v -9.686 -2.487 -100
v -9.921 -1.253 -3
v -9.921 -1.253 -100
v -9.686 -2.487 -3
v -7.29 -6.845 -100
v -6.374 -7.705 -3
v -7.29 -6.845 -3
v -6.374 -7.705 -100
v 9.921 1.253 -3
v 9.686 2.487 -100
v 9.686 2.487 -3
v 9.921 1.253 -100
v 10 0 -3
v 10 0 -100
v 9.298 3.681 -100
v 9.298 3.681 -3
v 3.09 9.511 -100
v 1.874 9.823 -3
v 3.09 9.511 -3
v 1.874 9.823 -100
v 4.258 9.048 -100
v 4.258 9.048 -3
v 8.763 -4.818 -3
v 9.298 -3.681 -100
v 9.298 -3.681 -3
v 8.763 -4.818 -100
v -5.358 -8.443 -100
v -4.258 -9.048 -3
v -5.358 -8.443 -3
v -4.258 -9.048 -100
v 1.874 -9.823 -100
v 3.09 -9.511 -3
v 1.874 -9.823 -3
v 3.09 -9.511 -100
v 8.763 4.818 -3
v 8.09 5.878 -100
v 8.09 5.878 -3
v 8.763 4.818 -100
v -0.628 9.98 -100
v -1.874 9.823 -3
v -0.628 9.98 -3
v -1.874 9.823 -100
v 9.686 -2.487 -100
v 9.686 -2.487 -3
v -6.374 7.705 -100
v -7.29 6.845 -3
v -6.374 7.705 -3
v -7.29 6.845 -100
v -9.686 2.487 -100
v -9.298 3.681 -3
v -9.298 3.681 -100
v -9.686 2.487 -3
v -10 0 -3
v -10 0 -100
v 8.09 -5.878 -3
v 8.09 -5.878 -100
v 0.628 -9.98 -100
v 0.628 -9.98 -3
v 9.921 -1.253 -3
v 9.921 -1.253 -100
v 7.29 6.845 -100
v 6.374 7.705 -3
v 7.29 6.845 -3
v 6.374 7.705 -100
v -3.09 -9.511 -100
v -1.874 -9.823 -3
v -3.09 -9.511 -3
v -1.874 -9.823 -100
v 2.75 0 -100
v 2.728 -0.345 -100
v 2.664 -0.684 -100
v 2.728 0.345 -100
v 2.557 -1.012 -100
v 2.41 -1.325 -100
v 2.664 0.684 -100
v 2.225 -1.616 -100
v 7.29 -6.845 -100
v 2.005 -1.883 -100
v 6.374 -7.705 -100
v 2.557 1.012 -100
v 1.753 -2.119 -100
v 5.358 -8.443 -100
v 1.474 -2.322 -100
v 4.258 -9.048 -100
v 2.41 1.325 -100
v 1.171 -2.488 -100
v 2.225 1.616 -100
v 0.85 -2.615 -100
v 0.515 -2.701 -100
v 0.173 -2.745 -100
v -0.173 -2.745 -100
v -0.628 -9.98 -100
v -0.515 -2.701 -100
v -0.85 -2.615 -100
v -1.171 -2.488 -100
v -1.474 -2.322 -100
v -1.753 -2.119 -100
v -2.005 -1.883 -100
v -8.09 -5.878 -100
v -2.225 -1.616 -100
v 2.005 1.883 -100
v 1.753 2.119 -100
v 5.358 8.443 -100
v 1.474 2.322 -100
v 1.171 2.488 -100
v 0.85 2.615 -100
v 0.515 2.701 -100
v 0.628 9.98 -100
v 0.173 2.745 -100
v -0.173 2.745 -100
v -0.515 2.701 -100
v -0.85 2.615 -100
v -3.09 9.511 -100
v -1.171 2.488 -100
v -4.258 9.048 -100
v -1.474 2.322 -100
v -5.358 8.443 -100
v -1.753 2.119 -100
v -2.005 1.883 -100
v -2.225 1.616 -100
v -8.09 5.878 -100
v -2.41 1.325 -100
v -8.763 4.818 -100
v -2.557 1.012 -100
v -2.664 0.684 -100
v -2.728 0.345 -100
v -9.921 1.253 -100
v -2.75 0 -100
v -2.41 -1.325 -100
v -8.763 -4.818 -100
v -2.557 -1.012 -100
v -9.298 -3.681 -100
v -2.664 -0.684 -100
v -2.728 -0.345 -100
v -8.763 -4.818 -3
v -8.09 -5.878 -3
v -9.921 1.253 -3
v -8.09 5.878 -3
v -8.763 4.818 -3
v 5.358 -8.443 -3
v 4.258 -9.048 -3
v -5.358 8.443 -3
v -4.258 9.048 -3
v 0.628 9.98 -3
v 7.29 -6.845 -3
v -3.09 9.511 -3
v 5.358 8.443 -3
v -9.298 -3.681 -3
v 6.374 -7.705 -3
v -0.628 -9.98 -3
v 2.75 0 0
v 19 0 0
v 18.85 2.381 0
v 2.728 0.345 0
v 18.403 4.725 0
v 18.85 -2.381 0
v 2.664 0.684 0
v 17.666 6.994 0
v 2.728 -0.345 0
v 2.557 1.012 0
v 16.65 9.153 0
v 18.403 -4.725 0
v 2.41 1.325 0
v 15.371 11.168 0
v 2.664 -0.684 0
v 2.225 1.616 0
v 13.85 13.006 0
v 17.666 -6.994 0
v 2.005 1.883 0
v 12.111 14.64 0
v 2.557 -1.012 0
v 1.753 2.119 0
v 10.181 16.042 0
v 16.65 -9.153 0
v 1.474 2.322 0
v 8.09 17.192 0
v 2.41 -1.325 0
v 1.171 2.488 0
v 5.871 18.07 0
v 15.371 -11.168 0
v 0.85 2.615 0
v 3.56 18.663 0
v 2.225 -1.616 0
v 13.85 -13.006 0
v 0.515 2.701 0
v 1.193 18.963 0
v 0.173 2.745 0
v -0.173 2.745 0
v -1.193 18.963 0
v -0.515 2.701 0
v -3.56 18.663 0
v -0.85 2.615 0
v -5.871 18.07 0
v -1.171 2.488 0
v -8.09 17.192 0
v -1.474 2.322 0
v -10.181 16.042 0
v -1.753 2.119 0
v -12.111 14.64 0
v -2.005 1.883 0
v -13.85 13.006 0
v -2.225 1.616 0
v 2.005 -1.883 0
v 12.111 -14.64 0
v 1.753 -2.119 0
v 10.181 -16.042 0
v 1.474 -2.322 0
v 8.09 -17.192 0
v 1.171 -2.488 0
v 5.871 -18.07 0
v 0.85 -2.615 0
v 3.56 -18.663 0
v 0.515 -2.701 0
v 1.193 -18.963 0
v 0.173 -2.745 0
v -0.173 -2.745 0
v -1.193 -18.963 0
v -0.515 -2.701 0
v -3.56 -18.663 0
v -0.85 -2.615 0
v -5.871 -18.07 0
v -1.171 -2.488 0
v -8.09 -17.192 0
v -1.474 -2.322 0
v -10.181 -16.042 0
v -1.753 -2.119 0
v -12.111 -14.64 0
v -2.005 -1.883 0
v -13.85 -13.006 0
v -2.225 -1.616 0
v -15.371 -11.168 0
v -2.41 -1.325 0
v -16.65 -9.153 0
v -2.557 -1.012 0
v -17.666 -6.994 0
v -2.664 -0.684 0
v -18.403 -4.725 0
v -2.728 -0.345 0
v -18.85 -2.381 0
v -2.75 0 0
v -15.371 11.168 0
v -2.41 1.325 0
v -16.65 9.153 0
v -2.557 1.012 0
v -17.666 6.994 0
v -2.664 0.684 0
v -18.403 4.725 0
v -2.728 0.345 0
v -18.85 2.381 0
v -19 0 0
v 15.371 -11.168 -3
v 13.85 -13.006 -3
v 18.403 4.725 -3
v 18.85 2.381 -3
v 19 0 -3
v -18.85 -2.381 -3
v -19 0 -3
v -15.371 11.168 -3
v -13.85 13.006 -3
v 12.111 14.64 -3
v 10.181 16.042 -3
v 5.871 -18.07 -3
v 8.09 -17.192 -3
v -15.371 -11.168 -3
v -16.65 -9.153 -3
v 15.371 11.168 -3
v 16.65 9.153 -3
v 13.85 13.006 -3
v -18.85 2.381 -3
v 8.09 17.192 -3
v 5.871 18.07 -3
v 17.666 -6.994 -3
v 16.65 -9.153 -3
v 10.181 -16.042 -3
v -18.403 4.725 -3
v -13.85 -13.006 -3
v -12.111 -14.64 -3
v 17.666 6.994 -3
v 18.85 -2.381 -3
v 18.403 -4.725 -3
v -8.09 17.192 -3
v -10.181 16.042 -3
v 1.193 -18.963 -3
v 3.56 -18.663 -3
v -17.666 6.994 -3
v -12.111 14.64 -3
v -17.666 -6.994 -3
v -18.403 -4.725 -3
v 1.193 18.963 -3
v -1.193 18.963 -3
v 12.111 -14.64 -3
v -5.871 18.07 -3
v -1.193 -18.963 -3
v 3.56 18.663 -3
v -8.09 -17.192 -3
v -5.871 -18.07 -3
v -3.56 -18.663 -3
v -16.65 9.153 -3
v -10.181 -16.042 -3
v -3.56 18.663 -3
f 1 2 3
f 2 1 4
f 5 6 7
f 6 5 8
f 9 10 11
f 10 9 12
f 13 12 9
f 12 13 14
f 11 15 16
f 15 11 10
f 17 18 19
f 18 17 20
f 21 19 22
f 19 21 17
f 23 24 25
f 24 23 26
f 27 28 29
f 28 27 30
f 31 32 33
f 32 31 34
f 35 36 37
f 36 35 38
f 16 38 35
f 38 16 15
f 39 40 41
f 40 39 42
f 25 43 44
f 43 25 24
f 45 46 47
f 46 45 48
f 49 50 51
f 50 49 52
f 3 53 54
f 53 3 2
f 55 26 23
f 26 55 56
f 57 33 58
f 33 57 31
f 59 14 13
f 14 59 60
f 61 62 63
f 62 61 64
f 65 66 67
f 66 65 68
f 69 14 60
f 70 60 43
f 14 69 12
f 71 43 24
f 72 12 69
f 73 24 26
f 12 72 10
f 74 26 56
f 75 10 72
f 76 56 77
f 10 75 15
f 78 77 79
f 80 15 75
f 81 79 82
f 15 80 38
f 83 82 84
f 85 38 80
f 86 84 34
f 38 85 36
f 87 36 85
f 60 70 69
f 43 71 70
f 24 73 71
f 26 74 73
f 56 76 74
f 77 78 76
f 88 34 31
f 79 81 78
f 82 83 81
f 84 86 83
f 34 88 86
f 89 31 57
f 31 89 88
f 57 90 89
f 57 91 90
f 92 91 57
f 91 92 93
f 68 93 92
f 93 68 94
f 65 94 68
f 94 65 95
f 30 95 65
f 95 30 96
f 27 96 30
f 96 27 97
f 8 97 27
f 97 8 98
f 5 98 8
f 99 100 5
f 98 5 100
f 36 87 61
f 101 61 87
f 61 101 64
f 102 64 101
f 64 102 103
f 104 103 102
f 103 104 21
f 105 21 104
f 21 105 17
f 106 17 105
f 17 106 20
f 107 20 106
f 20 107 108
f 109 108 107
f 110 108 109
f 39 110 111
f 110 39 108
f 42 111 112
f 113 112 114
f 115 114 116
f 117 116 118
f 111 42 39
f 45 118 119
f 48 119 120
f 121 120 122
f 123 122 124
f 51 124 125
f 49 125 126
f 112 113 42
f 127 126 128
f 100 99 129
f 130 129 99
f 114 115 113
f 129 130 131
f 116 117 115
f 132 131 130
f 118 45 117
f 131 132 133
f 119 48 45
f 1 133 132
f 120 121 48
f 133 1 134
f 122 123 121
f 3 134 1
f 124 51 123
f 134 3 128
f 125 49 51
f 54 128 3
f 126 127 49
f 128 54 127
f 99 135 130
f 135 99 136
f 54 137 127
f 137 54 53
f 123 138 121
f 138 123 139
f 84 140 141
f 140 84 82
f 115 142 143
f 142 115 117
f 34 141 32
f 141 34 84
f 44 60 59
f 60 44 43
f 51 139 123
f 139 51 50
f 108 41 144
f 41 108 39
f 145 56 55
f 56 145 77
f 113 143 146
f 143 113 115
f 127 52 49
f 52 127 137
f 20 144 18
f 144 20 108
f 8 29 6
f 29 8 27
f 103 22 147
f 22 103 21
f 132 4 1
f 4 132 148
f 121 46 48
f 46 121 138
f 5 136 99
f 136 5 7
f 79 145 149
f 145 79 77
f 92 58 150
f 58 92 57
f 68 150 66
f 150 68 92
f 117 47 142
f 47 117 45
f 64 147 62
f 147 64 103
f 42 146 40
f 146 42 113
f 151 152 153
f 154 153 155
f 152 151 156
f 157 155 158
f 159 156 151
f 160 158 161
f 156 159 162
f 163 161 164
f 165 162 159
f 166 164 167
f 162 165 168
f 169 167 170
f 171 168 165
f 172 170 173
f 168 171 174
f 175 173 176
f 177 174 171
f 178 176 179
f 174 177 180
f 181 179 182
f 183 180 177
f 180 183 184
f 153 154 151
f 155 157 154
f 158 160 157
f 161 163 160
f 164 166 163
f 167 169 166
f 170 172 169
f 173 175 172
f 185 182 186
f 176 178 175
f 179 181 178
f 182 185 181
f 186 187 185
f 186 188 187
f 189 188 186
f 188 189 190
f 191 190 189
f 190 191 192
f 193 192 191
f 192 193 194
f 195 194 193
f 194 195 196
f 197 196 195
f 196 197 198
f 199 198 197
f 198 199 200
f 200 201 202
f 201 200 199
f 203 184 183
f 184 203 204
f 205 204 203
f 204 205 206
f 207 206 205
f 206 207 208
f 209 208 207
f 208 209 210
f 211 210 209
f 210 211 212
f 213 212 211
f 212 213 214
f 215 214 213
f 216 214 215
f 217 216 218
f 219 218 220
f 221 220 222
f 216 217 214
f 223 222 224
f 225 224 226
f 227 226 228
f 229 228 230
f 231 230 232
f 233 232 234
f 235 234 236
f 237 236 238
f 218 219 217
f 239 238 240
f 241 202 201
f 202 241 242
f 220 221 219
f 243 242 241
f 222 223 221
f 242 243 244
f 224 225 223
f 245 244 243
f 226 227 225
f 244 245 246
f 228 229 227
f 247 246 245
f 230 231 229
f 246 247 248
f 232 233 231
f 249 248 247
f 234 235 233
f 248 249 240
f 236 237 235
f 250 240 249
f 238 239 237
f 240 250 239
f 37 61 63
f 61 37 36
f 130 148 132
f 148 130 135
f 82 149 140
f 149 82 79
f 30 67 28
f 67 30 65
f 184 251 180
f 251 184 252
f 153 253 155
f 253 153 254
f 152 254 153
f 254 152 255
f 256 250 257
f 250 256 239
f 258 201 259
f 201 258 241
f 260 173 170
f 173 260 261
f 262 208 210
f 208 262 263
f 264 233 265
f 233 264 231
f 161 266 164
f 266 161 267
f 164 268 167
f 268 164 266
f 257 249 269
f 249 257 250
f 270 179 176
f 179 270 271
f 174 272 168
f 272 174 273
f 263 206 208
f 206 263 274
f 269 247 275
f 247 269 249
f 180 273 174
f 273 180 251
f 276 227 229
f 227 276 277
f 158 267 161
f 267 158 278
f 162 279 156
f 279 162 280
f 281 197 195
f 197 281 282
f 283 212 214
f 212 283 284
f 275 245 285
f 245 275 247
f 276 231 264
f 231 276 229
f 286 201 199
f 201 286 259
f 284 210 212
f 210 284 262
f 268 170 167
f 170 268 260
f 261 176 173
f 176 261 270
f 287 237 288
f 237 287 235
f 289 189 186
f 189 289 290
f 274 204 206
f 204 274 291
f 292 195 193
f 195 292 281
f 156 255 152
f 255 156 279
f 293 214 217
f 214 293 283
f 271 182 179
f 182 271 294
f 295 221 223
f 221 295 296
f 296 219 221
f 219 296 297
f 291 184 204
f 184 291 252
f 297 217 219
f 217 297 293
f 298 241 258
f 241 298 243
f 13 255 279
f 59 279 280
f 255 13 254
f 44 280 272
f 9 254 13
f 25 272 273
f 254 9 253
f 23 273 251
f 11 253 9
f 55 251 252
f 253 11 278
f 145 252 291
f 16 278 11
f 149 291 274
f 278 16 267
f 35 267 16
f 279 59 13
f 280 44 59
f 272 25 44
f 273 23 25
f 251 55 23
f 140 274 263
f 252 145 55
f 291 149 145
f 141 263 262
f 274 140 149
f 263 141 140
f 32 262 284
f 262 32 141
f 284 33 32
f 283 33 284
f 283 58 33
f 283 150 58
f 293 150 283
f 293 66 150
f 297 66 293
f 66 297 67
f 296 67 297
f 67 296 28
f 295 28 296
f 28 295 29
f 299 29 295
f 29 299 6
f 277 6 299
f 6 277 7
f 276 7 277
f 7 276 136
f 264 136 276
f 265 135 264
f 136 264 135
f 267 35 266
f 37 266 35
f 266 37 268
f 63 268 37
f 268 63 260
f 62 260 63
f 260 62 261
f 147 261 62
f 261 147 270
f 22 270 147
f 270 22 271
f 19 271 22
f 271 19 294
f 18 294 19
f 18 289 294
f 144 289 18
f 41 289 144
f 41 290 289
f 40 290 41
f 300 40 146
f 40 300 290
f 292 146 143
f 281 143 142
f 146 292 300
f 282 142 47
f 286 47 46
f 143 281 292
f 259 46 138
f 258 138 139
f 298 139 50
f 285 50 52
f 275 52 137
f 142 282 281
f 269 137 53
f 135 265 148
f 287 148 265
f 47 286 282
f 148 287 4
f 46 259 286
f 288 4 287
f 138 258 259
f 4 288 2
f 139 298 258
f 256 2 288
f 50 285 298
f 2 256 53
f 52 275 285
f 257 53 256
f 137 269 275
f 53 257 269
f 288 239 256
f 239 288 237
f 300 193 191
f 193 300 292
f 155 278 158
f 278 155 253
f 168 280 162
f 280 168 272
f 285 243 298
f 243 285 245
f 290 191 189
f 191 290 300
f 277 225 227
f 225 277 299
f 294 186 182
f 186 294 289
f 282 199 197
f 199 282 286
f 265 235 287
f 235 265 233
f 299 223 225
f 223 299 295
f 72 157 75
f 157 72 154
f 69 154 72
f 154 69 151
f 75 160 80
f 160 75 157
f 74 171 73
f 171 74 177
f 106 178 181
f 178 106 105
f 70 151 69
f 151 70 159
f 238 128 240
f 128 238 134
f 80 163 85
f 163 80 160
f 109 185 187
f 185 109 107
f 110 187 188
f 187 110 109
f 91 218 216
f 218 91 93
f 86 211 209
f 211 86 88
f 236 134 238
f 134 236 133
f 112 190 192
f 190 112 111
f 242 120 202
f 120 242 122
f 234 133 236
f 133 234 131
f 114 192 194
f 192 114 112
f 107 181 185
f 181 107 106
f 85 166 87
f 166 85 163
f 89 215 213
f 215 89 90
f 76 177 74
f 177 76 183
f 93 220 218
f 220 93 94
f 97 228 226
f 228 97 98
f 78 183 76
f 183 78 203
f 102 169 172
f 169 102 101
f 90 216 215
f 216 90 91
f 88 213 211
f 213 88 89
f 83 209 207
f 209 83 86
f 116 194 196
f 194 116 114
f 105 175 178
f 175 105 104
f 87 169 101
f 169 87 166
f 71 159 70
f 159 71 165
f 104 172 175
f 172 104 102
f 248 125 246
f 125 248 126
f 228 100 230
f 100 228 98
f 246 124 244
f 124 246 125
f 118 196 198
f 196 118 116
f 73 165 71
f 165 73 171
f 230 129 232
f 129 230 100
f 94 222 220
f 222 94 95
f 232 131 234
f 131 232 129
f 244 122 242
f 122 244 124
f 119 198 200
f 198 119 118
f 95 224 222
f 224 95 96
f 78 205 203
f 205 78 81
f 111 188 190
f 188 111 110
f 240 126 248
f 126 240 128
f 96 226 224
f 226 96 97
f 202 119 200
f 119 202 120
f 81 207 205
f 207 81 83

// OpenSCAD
$fn = 50;


difference() {
	union() {
		translate(v = [0, 0, -100.0000000000]) {
			cylinder(h = 100, r = 10.0000000000);
		}
		translate(v = [0, 0, -3.0000000000]) {
			cylinder(h = 3, r = 19.0000000000);
		}
	}
	union() {
		#translate(v = [0, 0, -100]) {
			cylinder(h = 100, r = 2.7500000000);
		}
	}
}
